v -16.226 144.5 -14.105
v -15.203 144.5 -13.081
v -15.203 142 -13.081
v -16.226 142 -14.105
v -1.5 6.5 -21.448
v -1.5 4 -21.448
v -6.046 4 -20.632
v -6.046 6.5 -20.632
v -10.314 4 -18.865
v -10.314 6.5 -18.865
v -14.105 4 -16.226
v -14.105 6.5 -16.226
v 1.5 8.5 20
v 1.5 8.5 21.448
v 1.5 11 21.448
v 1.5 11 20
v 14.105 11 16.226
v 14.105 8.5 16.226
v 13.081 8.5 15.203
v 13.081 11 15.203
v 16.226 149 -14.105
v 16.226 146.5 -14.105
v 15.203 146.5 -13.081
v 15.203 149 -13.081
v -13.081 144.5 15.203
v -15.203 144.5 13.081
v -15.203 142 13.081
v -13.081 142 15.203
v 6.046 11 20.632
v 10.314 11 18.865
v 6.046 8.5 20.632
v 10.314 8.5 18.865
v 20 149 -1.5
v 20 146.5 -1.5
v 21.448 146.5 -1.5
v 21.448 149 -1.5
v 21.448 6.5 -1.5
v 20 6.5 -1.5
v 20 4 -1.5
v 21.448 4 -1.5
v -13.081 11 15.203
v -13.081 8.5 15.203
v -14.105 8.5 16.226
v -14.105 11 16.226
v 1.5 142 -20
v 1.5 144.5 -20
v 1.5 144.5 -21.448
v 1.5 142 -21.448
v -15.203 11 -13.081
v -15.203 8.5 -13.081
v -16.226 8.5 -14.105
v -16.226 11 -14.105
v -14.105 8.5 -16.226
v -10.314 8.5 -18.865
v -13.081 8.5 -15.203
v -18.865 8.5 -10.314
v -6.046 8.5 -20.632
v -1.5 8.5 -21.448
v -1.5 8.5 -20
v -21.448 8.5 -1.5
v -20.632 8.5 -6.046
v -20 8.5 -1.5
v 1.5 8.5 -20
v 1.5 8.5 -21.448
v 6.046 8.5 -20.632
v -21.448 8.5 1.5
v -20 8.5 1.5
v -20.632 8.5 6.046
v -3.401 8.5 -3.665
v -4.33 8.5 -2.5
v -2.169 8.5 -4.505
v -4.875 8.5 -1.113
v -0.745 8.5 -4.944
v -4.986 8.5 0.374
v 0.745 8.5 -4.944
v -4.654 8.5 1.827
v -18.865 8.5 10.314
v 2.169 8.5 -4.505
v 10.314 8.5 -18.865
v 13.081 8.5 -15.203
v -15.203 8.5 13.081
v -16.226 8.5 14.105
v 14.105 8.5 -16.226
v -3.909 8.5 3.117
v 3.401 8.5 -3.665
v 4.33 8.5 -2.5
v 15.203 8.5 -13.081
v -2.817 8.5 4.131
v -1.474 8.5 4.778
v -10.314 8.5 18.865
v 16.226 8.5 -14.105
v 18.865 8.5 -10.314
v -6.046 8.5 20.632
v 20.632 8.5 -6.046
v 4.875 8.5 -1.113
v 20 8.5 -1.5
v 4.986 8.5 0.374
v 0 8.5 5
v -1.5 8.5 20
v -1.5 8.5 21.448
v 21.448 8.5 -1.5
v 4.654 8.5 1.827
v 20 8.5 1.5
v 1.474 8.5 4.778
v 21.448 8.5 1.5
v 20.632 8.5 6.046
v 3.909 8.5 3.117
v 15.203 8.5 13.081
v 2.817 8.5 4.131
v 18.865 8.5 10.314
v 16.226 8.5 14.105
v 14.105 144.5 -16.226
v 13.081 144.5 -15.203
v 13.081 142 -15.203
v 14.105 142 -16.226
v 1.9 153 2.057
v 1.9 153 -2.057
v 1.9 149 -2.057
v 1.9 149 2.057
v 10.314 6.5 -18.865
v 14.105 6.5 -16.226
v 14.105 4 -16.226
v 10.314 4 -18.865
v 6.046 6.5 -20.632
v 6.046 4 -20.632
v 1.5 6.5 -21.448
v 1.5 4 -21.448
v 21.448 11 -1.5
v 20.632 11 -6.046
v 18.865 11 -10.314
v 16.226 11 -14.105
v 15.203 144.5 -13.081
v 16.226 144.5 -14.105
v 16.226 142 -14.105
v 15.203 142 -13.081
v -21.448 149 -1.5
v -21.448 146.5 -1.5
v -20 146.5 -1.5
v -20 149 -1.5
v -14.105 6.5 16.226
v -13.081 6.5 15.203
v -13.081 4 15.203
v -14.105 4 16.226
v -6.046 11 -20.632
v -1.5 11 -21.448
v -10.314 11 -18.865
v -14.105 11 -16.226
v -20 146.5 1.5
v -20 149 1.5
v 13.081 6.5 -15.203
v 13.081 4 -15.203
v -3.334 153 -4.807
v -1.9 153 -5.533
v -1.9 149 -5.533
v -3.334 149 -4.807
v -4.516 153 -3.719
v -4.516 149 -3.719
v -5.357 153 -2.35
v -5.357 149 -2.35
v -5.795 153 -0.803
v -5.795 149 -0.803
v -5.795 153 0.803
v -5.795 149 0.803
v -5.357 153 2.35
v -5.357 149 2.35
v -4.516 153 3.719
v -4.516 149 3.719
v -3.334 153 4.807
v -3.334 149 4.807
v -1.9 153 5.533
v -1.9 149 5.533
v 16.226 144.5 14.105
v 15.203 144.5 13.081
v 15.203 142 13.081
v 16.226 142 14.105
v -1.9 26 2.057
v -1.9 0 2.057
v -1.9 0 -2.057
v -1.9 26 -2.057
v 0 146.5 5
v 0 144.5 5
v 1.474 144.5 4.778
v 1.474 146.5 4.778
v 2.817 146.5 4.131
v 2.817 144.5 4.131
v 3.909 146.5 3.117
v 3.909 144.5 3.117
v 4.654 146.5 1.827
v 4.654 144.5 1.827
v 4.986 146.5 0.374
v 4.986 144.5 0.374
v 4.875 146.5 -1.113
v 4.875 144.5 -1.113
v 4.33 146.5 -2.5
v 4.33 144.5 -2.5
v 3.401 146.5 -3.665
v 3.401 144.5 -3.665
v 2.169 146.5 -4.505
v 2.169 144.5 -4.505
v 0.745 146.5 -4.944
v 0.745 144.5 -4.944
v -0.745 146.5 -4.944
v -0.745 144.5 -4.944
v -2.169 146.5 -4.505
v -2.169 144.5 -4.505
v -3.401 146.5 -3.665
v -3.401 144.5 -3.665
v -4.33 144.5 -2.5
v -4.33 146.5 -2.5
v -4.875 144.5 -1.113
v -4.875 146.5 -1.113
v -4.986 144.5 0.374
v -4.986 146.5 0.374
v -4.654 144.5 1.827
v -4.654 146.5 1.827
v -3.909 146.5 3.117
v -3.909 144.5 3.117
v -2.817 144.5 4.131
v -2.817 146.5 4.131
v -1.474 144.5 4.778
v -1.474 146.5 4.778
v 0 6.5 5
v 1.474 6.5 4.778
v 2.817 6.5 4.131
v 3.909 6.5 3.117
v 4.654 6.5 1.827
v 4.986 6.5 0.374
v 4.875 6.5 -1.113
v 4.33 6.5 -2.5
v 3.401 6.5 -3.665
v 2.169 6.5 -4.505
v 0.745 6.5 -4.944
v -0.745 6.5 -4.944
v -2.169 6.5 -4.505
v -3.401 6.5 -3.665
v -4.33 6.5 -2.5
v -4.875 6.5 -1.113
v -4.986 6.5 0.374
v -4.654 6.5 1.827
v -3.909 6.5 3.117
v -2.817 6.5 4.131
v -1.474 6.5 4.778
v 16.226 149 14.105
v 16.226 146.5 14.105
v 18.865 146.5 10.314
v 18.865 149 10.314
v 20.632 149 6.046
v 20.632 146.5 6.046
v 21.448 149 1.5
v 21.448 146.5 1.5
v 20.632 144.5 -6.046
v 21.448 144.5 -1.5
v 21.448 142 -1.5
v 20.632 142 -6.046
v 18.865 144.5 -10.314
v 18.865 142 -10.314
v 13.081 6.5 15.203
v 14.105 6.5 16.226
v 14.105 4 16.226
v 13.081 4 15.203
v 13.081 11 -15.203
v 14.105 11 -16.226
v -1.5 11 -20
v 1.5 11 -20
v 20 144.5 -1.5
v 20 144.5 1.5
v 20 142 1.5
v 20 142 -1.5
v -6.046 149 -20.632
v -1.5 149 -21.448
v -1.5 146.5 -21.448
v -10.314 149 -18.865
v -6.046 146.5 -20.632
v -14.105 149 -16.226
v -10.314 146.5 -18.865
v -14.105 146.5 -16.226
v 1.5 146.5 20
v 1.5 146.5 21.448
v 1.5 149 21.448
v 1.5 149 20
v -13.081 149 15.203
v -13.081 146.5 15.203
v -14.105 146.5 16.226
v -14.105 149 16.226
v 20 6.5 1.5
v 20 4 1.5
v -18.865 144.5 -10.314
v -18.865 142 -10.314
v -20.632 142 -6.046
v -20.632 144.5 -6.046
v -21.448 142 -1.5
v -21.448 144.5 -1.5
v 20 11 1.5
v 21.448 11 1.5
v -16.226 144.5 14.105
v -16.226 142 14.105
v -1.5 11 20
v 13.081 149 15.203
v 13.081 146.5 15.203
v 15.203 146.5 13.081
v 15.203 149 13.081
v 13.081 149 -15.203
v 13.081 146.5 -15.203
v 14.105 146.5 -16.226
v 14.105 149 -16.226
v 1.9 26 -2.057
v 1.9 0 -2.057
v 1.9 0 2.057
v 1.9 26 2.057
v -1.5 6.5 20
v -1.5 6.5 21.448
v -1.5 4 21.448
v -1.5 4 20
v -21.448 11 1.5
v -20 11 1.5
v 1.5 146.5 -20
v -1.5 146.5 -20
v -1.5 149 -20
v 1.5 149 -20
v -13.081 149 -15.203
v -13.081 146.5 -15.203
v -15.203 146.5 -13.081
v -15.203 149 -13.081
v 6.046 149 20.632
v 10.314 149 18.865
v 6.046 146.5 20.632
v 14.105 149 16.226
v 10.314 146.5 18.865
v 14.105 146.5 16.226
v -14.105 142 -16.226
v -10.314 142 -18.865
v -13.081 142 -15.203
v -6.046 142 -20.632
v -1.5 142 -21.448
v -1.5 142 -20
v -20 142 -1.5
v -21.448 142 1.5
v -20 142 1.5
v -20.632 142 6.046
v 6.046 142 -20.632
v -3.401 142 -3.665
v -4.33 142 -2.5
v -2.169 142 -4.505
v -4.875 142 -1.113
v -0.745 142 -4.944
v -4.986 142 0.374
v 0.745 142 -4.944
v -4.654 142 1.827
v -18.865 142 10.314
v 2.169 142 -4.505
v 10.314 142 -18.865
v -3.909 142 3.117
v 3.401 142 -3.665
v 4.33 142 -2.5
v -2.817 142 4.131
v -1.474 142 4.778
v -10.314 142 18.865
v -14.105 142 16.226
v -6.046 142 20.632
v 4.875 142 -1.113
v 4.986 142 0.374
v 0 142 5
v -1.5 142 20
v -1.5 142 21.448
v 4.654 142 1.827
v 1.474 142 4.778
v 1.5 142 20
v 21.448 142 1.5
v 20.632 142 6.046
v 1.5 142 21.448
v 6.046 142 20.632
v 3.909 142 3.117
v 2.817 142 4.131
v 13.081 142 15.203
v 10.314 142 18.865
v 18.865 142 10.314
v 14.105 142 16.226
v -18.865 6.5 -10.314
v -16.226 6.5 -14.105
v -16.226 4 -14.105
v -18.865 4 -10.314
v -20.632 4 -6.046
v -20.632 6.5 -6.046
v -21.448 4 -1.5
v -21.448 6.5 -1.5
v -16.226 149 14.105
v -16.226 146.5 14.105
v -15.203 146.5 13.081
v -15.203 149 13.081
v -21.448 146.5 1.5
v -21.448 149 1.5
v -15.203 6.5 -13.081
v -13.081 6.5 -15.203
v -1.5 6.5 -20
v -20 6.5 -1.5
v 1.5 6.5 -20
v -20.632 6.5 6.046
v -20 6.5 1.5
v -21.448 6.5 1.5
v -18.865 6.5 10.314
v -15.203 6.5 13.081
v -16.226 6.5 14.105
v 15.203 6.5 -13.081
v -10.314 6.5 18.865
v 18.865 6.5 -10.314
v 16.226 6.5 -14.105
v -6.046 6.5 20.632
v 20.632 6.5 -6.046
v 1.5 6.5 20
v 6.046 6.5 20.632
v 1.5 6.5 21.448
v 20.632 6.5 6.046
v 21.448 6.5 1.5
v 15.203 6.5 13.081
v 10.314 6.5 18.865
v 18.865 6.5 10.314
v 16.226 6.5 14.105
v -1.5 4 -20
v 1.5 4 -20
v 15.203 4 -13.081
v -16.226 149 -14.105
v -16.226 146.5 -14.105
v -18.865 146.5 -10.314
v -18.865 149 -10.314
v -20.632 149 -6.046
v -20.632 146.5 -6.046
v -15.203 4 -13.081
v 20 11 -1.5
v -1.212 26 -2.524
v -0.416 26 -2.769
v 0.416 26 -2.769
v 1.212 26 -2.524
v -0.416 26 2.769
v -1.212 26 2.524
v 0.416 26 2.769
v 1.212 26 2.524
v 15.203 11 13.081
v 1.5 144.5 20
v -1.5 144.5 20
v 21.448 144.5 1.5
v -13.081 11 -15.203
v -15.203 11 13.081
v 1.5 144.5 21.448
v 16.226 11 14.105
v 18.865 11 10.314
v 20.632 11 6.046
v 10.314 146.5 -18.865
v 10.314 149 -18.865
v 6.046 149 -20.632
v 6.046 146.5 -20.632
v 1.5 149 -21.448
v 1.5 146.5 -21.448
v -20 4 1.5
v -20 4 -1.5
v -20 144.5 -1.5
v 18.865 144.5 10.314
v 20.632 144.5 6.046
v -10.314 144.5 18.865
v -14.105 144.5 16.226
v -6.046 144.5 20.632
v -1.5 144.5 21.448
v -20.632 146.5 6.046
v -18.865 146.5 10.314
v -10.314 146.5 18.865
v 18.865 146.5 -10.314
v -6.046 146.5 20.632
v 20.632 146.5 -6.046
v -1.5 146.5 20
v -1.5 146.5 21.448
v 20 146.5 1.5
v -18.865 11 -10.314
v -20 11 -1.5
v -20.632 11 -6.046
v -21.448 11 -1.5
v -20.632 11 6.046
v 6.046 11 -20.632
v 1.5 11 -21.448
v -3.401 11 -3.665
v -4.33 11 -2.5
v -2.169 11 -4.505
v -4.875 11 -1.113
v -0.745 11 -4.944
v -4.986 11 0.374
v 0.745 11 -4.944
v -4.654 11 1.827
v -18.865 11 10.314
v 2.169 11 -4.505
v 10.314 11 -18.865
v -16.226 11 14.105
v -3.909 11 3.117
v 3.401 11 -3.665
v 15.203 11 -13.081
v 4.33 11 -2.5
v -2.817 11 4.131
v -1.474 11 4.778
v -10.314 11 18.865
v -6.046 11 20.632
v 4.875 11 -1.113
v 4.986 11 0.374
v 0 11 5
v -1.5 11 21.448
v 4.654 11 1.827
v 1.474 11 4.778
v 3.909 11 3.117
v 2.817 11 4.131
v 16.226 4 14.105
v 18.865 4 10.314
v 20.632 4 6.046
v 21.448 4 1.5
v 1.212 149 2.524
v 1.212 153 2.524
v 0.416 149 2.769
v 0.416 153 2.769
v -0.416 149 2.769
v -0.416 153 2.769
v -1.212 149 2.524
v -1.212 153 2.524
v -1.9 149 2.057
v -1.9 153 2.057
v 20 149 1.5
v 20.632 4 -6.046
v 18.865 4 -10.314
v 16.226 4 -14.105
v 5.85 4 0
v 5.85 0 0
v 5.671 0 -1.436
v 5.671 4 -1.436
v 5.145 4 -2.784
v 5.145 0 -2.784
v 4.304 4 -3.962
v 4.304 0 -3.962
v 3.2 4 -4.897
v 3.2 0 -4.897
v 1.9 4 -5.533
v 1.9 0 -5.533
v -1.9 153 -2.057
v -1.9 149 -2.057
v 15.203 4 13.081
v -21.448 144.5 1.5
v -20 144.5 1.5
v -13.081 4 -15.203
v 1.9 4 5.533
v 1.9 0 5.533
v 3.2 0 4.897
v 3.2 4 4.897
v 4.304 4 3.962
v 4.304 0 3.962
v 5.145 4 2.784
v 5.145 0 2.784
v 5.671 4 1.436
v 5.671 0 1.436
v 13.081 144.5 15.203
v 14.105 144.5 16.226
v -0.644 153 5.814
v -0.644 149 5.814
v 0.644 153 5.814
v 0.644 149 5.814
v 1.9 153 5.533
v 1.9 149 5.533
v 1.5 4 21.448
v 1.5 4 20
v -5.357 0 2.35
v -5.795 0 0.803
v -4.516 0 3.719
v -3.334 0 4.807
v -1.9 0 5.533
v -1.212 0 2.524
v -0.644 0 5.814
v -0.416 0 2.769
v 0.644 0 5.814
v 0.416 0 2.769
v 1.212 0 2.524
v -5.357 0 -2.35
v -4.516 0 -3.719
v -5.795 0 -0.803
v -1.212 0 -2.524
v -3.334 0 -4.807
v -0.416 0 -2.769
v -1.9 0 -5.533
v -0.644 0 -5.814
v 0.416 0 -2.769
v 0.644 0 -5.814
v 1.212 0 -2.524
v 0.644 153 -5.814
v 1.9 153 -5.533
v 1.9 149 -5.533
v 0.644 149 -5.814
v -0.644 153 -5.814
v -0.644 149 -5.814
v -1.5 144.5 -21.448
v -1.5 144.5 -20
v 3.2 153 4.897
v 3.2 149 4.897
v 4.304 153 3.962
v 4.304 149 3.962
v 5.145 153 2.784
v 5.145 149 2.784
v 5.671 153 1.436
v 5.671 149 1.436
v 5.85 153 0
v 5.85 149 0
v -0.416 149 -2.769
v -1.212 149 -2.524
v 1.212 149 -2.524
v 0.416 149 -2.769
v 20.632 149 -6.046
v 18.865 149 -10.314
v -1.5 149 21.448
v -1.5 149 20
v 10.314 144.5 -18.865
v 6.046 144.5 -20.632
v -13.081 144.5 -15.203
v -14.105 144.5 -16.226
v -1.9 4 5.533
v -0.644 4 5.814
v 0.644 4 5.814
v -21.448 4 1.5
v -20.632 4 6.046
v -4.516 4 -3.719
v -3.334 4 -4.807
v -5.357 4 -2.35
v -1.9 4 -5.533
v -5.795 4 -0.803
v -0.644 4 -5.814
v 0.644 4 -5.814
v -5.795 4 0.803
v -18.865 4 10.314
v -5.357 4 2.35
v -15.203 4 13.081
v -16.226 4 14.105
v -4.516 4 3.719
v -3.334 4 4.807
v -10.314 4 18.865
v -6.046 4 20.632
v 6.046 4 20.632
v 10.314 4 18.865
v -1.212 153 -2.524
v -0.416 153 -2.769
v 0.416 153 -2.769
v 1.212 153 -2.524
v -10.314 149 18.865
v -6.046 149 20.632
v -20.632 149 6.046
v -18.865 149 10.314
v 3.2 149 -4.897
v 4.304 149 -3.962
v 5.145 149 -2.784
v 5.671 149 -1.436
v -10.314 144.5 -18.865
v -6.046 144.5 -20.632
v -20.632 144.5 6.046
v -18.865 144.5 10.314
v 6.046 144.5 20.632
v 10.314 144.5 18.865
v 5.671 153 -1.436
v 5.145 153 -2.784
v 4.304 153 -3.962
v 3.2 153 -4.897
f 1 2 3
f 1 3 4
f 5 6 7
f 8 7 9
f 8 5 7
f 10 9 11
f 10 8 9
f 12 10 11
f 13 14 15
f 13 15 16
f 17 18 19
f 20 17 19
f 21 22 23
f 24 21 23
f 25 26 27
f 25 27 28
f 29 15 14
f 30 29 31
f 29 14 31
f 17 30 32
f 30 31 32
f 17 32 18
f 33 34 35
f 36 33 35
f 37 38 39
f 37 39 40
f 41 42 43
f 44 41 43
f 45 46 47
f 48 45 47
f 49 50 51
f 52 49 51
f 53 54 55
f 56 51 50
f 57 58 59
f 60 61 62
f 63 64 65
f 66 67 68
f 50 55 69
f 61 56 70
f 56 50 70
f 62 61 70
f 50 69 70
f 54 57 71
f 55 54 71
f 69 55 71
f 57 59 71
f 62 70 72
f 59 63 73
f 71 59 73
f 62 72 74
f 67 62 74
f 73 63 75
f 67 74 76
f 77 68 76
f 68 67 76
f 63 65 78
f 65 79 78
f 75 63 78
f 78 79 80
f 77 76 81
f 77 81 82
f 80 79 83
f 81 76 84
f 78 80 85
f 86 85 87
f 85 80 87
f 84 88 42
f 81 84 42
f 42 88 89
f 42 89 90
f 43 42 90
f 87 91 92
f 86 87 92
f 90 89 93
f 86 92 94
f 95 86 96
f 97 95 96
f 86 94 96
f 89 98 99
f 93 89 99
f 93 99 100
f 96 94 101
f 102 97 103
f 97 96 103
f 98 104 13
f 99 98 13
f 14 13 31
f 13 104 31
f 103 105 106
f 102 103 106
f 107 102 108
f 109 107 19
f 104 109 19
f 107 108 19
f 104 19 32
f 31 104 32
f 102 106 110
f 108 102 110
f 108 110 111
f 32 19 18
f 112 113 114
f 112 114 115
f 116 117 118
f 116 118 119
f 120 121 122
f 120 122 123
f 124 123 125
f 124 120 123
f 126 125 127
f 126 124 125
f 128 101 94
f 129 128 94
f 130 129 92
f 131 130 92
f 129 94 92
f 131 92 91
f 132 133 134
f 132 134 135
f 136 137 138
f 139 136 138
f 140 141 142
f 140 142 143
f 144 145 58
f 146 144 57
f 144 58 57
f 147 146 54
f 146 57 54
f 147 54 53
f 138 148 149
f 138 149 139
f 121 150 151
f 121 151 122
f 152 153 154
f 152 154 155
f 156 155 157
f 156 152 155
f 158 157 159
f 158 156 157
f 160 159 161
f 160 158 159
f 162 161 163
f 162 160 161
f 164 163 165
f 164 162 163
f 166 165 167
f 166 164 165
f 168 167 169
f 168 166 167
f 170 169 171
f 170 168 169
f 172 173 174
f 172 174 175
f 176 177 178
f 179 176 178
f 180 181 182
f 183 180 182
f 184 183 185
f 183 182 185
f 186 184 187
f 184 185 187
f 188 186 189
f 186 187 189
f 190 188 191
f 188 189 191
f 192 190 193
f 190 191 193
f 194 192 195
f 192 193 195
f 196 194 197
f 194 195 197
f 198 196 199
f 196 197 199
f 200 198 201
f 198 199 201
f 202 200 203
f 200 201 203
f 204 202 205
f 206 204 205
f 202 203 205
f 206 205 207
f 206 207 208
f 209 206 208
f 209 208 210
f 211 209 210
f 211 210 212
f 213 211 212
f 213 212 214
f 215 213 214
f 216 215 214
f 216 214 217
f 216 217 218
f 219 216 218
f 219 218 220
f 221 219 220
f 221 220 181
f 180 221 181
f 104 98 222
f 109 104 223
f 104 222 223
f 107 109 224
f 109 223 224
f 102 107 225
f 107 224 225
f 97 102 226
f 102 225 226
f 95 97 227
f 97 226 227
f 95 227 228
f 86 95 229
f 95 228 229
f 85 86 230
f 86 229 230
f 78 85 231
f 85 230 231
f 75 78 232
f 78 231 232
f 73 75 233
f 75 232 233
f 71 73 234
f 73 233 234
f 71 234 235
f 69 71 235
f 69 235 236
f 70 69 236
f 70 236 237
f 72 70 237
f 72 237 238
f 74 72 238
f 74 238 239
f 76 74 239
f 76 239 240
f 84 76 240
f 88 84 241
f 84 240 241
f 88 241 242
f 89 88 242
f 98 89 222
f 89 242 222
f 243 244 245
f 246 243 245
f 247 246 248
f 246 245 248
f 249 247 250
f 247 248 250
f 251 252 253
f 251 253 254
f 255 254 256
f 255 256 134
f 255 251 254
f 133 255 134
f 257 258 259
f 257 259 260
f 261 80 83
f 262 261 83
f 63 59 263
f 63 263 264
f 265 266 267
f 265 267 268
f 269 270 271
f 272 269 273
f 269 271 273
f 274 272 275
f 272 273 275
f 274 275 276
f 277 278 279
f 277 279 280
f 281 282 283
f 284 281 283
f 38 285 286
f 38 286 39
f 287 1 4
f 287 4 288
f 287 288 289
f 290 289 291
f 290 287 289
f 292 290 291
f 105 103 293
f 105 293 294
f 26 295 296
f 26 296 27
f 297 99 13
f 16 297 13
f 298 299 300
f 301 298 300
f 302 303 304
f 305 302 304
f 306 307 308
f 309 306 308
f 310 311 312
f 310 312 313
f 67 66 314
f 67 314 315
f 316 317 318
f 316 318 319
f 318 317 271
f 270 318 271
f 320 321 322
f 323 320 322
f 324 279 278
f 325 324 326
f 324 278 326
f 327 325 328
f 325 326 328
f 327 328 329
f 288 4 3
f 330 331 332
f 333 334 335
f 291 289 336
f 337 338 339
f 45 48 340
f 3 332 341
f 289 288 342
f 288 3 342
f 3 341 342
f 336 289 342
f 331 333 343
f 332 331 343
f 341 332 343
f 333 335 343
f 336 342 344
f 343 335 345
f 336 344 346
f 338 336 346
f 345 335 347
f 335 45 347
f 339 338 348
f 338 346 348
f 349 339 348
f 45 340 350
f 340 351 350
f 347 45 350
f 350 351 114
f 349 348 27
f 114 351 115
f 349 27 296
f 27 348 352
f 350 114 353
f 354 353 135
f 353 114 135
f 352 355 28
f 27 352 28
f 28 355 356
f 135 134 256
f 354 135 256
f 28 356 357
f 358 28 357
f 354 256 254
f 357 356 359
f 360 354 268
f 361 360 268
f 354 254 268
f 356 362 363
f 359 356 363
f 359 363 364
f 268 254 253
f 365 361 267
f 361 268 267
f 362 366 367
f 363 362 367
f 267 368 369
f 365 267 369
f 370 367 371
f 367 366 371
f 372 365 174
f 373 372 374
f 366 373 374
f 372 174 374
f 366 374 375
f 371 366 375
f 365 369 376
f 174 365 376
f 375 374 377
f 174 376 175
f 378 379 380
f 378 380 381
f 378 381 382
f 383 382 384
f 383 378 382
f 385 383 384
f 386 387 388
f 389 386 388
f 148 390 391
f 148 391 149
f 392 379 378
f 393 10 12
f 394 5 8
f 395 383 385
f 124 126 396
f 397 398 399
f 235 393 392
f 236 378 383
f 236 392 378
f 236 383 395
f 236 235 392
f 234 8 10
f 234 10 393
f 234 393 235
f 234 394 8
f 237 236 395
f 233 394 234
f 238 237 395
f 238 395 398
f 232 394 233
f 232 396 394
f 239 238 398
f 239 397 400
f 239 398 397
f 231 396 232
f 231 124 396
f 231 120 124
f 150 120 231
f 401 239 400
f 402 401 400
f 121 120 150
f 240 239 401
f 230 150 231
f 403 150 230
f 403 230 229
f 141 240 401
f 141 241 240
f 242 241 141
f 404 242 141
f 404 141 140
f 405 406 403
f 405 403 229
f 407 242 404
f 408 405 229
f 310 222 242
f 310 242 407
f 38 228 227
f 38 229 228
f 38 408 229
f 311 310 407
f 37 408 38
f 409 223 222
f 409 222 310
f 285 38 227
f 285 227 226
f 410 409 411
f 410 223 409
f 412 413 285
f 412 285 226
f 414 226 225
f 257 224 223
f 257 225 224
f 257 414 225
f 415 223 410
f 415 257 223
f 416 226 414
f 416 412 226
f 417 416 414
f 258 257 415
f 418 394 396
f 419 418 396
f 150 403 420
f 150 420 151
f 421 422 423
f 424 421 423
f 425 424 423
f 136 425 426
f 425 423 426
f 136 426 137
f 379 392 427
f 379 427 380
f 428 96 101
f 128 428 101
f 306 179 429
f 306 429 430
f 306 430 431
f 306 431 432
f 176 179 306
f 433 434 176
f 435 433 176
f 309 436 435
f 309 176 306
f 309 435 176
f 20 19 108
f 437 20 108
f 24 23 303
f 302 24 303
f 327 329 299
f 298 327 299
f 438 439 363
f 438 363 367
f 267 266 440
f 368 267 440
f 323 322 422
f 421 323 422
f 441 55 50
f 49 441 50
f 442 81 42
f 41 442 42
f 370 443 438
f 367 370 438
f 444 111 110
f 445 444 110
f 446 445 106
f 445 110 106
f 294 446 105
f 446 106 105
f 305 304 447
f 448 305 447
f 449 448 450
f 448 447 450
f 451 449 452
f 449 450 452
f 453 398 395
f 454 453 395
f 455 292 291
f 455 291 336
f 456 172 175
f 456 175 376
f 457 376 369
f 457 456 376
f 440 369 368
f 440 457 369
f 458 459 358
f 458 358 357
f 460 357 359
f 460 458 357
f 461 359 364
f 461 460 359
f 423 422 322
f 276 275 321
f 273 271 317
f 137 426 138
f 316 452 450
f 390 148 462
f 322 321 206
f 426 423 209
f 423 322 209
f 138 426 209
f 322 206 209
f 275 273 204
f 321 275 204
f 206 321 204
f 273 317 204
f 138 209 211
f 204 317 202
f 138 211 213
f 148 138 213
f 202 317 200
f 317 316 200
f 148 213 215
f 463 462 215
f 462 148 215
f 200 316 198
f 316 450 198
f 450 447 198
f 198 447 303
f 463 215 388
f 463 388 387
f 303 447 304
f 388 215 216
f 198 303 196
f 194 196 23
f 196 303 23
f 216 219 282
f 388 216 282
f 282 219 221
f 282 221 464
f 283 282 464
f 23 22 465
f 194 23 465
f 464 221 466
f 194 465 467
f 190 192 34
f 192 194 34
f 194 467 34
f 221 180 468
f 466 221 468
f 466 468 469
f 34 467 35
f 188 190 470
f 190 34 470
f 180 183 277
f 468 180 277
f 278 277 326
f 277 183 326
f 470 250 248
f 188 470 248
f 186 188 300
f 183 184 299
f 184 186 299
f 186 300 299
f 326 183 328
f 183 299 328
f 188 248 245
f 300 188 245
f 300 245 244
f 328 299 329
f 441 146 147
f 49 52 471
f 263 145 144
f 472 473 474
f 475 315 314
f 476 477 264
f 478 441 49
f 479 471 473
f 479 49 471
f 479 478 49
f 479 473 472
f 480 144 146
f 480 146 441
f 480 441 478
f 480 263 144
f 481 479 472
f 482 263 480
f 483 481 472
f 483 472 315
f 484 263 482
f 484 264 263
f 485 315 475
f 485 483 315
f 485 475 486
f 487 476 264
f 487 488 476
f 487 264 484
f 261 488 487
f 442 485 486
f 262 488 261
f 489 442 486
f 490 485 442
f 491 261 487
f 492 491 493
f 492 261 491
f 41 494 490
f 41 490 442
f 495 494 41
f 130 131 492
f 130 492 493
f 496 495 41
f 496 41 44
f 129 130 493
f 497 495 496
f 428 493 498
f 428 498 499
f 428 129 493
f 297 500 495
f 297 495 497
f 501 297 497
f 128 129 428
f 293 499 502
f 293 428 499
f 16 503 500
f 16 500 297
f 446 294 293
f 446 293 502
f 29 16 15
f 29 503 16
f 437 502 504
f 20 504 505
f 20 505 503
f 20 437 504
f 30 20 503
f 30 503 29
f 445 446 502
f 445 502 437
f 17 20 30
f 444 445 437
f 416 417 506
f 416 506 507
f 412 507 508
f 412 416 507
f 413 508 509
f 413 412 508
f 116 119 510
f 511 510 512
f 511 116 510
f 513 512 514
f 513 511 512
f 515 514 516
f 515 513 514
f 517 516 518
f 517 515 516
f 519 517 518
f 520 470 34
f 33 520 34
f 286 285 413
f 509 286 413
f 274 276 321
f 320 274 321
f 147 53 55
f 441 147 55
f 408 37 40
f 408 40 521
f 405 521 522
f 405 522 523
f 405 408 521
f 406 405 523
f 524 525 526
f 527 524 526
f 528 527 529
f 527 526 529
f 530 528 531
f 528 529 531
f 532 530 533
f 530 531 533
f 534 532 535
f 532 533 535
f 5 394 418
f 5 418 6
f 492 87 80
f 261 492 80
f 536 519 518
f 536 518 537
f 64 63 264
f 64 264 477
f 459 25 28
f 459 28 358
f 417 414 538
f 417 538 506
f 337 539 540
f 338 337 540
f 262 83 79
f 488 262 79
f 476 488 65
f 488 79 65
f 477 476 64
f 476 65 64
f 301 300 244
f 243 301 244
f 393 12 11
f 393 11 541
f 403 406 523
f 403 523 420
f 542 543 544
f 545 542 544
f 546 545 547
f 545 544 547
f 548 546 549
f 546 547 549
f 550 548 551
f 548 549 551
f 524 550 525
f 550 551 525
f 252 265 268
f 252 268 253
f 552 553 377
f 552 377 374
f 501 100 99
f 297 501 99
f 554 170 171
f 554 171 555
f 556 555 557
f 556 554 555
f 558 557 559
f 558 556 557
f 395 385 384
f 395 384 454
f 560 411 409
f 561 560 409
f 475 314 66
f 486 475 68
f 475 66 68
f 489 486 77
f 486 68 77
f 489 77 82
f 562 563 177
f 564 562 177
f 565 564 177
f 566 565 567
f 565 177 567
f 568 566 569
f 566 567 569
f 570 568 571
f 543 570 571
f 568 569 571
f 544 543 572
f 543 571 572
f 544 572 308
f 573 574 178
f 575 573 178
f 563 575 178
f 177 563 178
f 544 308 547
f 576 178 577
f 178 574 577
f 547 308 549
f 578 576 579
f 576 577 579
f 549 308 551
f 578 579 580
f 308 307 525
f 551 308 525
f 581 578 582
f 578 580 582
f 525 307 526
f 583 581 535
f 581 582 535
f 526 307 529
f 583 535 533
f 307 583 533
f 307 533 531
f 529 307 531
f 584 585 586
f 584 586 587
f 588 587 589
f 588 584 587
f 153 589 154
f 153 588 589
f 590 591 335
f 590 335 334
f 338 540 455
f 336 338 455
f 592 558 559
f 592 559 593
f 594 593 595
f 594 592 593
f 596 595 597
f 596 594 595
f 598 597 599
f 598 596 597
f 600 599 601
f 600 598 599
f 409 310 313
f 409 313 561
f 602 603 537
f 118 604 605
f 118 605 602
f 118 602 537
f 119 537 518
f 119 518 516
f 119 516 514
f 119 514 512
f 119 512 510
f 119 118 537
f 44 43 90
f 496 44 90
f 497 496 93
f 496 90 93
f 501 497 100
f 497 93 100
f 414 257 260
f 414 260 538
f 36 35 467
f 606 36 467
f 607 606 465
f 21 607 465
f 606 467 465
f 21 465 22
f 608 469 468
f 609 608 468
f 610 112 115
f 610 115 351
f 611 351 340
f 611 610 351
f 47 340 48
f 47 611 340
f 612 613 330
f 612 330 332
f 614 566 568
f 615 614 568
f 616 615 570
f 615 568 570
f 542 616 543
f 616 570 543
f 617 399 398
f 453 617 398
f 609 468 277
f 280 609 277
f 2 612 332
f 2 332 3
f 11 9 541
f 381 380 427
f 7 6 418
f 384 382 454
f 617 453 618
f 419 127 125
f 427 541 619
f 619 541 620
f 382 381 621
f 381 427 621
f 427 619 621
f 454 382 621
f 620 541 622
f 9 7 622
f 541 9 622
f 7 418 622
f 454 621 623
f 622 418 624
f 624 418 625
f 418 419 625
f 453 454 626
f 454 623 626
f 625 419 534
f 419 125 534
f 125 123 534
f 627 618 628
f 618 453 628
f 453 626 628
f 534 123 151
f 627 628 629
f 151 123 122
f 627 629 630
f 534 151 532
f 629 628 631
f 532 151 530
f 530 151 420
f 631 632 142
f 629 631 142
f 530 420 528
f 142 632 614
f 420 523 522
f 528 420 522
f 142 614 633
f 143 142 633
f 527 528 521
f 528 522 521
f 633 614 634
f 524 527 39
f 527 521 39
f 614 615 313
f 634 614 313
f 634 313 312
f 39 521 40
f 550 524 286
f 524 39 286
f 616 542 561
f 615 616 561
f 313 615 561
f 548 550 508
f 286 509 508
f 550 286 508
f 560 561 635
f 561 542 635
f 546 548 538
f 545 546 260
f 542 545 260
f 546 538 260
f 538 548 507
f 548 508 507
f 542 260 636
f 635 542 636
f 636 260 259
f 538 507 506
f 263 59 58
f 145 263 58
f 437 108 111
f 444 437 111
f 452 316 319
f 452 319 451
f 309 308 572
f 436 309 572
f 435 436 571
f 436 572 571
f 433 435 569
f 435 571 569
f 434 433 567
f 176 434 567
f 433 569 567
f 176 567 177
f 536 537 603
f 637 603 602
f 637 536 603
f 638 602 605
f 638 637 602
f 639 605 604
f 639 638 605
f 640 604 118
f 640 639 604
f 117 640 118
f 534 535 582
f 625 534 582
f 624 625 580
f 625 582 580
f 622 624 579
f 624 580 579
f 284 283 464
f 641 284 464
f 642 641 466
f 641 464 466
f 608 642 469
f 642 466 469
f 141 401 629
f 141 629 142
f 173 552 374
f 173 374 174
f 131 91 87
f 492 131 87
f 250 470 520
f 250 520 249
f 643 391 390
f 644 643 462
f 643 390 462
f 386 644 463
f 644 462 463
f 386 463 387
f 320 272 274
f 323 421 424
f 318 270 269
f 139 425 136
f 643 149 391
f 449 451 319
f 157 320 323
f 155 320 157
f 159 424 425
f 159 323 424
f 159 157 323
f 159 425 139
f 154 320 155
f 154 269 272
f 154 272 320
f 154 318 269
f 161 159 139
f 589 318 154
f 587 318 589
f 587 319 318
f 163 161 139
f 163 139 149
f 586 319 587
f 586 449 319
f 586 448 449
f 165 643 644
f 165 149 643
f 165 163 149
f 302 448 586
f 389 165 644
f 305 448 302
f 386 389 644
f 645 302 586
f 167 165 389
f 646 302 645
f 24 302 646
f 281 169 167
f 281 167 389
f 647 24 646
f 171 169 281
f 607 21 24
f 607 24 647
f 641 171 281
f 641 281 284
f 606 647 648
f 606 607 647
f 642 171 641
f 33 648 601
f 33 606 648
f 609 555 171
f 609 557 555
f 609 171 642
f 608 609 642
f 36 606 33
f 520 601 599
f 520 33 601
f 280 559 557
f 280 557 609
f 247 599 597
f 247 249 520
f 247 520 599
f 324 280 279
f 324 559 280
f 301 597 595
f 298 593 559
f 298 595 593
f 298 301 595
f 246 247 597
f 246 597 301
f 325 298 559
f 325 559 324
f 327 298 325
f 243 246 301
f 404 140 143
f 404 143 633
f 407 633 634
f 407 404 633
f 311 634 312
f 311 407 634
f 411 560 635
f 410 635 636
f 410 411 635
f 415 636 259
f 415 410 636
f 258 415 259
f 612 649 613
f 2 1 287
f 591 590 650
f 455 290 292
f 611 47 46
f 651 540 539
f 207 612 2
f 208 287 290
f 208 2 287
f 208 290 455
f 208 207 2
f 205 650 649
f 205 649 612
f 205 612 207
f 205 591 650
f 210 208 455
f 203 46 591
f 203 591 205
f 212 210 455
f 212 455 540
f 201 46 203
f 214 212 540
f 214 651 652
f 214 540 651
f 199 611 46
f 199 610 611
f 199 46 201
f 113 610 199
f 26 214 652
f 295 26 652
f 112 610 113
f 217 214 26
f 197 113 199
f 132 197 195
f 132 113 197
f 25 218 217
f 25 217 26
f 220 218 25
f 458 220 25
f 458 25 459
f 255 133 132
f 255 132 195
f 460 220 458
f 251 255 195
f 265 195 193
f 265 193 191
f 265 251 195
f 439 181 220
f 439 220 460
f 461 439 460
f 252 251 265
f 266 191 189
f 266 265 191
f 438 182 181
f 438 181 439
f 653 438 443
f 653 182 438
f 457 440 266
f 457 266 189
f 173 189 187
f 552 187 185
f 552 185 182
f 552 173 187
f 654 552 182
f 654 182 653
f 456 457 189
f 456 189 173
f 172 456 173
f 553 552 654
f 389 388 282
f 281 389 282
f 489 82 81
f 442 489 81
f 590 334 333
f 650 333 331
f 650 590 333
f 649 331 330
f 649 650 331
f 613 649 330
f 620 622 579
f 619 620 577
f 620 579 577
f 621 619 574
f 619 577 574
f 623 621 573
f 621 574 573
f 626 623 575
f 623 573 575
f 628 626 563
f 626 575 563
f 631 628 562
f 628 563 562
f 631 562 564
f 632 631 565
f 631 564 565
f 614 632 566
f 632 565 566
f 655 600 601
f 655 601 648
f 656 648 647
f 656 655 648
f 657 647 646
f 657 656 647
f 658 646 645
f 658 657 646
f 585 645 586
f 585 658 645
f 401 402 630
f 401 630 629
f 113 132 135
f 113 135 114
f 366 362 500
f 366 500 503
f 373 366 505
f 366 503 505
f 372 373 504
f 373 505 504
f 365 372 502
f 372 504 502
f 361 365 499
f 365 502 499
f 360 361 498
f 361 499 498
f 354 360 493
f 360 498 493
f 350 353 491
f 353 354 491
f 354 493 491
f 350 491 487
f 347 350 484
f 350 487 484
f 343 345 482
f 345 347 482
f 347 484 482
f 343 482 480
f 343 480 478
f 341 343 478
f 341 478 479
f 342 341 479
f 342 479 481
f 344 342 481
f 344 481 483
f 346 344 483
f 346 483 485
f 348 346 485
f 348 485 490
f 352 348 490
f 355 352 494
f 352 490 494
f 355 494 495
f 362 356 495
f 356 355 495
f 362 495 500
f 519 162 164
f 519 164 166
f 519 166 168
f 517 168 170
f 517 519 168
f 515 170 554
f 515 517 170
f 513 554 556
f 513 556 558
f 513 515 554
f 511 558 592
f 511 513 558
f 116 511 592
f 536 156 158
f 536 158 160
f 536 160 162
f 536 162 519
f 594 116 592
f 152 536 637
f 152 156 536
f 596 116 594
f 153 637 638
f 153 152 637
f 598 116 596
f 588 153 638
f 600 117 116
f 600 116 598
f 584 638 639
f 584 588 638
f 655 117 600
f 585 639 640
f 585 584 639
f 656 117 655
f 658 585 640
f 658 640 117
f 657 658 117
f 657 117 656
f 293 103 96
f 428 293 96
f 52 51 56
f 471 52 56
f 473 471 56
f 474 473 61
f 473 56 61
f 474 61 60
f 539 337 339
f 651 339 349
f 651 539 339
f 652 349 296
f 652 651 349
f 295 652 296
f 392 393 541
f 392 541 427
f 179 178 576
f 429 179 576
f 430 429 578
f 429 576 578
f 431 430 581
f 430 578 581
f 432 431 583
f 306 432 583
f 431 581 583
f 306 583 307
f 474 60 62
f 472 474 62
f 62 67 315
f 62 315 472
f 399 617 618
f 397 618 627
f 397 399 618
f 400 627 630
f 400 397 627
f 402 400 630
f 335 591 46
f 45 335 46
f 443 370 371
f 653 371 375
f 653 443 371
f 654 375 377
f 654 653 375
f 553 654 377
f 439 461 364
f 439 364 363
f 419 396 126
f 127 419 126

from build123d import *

# Parameters (mm, degrees)
BOSS_EXTRUDE1_DEPTH     = 6.5
SKETCH2_R               = 21.5
BOSS_EXTRUDE2_DEPTH     = 2.5
CUT_EXTRUDE1_DEPTH      = 8
SKETCH4_W               = 3
SKETCH4_H               = 3
CUT_EXTRUDE2_DEPTH      = 10
SKETCH5_R               = 5
BOSS_EXTRUDE3_DEPTH     = 140
CUT_EXTRUDE3_DEPTH      = 15
MIRROR6_COPY_1_SKETCH_R = 21.5
MIRROR6_COPY_1_DEPTH    = 2.5
MIRROR6_COPY_2_SKETCH_W = 3
MIRROR6_COPY_2_SKETCH_H = 3
MIRROR6_COPY_2_DEPTH    = 10


with BuildPart() as part:
    # Sketch1 → Boss-Extrude1 (new body)
    with BuildSketch(Plane(origin=(0, 0, 0), x_dir=(1, 0, 0), z_dir=(0, 1, 0))):
        with BuildLine():
            ThreePointArc((-1.9, -2.05669638), (-2.8, 0), (-1.9, 2.05669638))
            Line((-1.9, 2.05669638), (-1.9, 5.532856405))
            ThreePointArc((-1.9, 5.532856405), (-5.85, 0), (-1.9, -5.532856405))
            Line((-1.9, -5.532856405), (-1.9, -2.05669638))
        make_face()
        with BuildLine():
            ThreePointArc((-1.9, 2.05669638), (0, 2.8), (1.9, 2.05669638))
            Line((1.9, 2.05669638), (1.9, 5.532856405))
            ThreePointArc((1.9, 5.532856405), (0, 5.85), (-1.9, 5.532856405))
            Line((-1.9, 5.532856405), (-1.9, 2.05669638))
        make_face()
        with BuildLine():
            Line((1.9, 5.532856405), (1.9, 2.05669638))
            ThreePointArc((1.9, 2.05669638), (2.565151068, 1.122497216), (2.8, 0))
            ThreePointArc((2.8, 0), (2.565151068, -1.122497216), (1.9, -2.05669638))
            Line((1.9, -2.05669638), (1.9, -5.532856405))
            ThreePointArc((1.9, -5.532856405), (4.761171074, -3.399080758), (5.85, 0))
            ThreePointArc((5.85, 0), (4.761171074, 3.399080758), (1.9, 5.532856405))
        make_face()
        with BuildLine():
            Line((1.9, -5.532856405), (1.9, -2.05669638))
            ThreePointArc((1.9, -2.05669638), (0, -2.8), (-1.9, -2.05669638))
            Line((-1.9, -2.05669638), (-1.9, -5.532856405))
            ThreePointArc((-1.9, -5.532856405), (0, -5.85), (1.9, -5.532856405))
        make_face()
        with BuildLine():
            Line((-1.9, -2.05669638), (-1.9, 2.05669638))
            ThreePointArc((-1.9, 2.05669638), (-2.8, 0), (-1.9, -2.05669638))
        make_face()
        with BuildLine():
            ThreePointArc((2.8, 0), (2.565151068, 1.122497216), (1.9, 2.05669638))
            Line((1.9, 2.05669638), (1.9, -2.05669638))
            ThreePointArc((1.9, -2.05669638), (2.565151068, -1.122497216), (2.8, 0))
        make_face()
    boss_extrude1 = extrude(amount=BOSS_EXTRUDE1_DEPTH)

    # Sketch2 → Boss-Extrude2 (add)
    with BuildSketch(Plane(origin=(0, 6.5, 0), x_dir=(1, 0, 0), z_dir=(0, 1, 0))):
        with Locations(Location((0, 0, 0), (0, 0, 270))):
            Circle(SKETCH2_R)
    boss_extrude2 = extrude(amount=-BOSS_EXTRUDE2_DEPTH)

    # Sketch3 → Cut-Extrude1 (cut)
    with BuildSketch(Plane.XZ.offset(-4)):
        with BuildLine():
            Line((-1.9, 2.05669638), (-1.9, -2.05669638))
            ThreePointArc((-1.9, -2.05669638), (0, -2.8), (1.9, -2.05669638))
            Line((1.9, -2.05669638), (1.9, 2.05669638))
            ThreePointArc((1.9, 2.05669638), (0, 2.8), (-1.9, 2.05669638))
        make_face()
    cut_extrude1 = extrude(amount=-CUT_EXTRUDE1_DEPTH, mode=Mode.SUBTRACT)

    # Sketch4 → Cut-Extrude2 (cut)
    with BuildSketch(Plane(origin=(0, 6.5, 0), x_dir=(1, 0, 0), z_dir=(0, 1, 0))):
        Polygon((15.202795796, -13.081475452), (17.324116139, -15.202795796), (15.202795796, -17.324116139), (13.081475452, -15.202795796), align=None)
        with Locations((21.5, 0)):
            Rectangle(SKETCH4_W, SKETCH4_H)
        with Locations((0, -21.5)):
            Rectangle(SKETCH4_W, SKETCH4_H)
        Polygon((-13.081475452, -15.202795796), (-15.202795796, -17.324116139), (-17.324116139, -15.202795796), (-15.202795796, -13.081475452), align=None)
        with Locations((-21.5, 0)):
            Rectangle(SKETCH4_W, SKETCH4_H)
        Polygon((-15.202795796, 13.081475452), (-17.324116139, 15.202795796), (-15.202795796, 17.324116139), (-13.081475452, 15.202795796), align=None)
        with Locations((0, 21.5)):
            Rectangle(SKETCH4_W, SKETCH4_H)
        Polygon((13.081475452, 15.202795796), (15.202795796, 17.324116139), (17.324116139, 15.202795796), (15.202795796, 13.081475452), align=None)
    cut_extrude2 = extrude(amount=-CUT_EXTRUDE2_DEPTH, mode=Mode.SUBTRACT)

    # Sketch5 → Boss-Extrude3 (add)
    with BuildSketch(Plane(origin=(0, 6.5, 0), x_dir=(1, 0, 0), z_dir=(0, 1, 0))):
        with Locations(Location((0, 0, 0), (0, 0, 270))):
            Circle(SKETCH5_R)
    extrude(amount=BOSS_EXTRUDE3_DEPTH)

    # Mirror1: Boss-Extrude2 across plane
    add(boss_extrude2.mirror(Plane.ZX.offset(76.5)))

    # Mirror2: Boss-Extrude1 across plane
    add(boss_extrude1.mirror(Plane.ZX.offset(76.5)))

    # Mirror3: Boss-Extrude2, Cut-Extrude1, Cut-Extrude2 across plane
    add(boss_extrude2.mirror(Plane.ZX.offset(7.5)))
    add(cut_extrude1.mirror(Plane.ZX.offset(7.5)), mode=Mode.SUBTRACT)
    add(cut_extrude2.mirror(Plane.ZX.offset(7.5)), mode=Mode.SUBTRACT)

    # Sketch6 → Cut-Extrude3 (cut)
    with BuildSketch(Plane.XZ.offset(-11)):
        with BuildLine():
            Line((-1.9, 2.05669638), (-1.9, -2.05669638))
            ThreePointArc((-1.9, -2.05669638), (0, -2.8), (1.9, -2.05669638))
            Line((1.9, -2.05669638), (1.9, 2.05669638))
            ThreePointArc((1.9, 2.05669638), (0, 2.8), (-1.9, 2.05669638))
        make_face()
    extrude(amount=-CUT_EXTRUDE3_DEPTH, mode=Mode.SUBTRACT)

    # Mirror5: Cut-Extrude2 across plane
    add(cut_extrude2.mirror(Plane.ZX.offset(76.5)), mode=Mode.SUBTRACT)

    # Mirror6 copy 1 sketch → Mirror6 copy 1 (add)
    with BuildSketch(Plane(origin=(0, 144.5, 0), x_dir=(1, 0, 0), z_dir=(0, 1, 0))):
        with Locations(Location((0, 0, 0), (0, 0, 270))):
            Circle(MIRROR6_COPY_1_SKETCH_R)
    extrude(amount=-MIRROR6_COPY_1_DEPTH)

    # Mirror6 copy 2 sketch → Mirror6 copy 2 (cut)
    with BuildSketch(Plane(origin=(0, 144.5, 0), x_dir=(1, 0, 0), z_dir=(0, 1, 0))):
        Polygon((15.202795796, -13.081475452), (17.324116139, -15.202795796), (15.202795796, -17.324116139), (13.081475452, -15.202795796), align=None)
        with Locations((21.5, 0)):
            Rectangle(MIRROR6_COPY_2_SKETCH_W, MIRROR6_COPY_2_SKETCH_H)
        with Locations((0, -21.5)):
            Rectangle(MIRROR6_COPY_2_SKETCH_W, MIRROR6_COPY_2_SKETCH_H)
        Polygon((-13.081475452, -15.202795796), (-15.202795796, -17.324116139), (-17.324116139, -15.202795796), (-15.202795796, -13.081475452), align=None)
        with Locations((-21.5, 0)):
            Rectangle(MIRROR6_COPY_2_SKETCH_W, MIRROR6_COPY_2_SKETCH_H)
        Polygon((-15.202795796, 13.081475452), (-17.324116139, 15.202795796), (-15.202795796, 17.324116139), (-13.081475452, 15.202795796), align=None)
        with Locations((0, 21.5)):
            Rectangle(MIRROR6_COPY_2_SKETCH_W, MIRROR6_COPY_2_SKETCH_H)
        Polygon((13.081475452, 15.202795796), (15.202795796, 17.324116139), (17.324116139, 15.202795796), (15.202795796, 13.081475452), align=None)
    extrude(amount=-MIRROR6_COPY_2_DEPTH, mode=Mode.SUBTRACT)


solid = part.part
